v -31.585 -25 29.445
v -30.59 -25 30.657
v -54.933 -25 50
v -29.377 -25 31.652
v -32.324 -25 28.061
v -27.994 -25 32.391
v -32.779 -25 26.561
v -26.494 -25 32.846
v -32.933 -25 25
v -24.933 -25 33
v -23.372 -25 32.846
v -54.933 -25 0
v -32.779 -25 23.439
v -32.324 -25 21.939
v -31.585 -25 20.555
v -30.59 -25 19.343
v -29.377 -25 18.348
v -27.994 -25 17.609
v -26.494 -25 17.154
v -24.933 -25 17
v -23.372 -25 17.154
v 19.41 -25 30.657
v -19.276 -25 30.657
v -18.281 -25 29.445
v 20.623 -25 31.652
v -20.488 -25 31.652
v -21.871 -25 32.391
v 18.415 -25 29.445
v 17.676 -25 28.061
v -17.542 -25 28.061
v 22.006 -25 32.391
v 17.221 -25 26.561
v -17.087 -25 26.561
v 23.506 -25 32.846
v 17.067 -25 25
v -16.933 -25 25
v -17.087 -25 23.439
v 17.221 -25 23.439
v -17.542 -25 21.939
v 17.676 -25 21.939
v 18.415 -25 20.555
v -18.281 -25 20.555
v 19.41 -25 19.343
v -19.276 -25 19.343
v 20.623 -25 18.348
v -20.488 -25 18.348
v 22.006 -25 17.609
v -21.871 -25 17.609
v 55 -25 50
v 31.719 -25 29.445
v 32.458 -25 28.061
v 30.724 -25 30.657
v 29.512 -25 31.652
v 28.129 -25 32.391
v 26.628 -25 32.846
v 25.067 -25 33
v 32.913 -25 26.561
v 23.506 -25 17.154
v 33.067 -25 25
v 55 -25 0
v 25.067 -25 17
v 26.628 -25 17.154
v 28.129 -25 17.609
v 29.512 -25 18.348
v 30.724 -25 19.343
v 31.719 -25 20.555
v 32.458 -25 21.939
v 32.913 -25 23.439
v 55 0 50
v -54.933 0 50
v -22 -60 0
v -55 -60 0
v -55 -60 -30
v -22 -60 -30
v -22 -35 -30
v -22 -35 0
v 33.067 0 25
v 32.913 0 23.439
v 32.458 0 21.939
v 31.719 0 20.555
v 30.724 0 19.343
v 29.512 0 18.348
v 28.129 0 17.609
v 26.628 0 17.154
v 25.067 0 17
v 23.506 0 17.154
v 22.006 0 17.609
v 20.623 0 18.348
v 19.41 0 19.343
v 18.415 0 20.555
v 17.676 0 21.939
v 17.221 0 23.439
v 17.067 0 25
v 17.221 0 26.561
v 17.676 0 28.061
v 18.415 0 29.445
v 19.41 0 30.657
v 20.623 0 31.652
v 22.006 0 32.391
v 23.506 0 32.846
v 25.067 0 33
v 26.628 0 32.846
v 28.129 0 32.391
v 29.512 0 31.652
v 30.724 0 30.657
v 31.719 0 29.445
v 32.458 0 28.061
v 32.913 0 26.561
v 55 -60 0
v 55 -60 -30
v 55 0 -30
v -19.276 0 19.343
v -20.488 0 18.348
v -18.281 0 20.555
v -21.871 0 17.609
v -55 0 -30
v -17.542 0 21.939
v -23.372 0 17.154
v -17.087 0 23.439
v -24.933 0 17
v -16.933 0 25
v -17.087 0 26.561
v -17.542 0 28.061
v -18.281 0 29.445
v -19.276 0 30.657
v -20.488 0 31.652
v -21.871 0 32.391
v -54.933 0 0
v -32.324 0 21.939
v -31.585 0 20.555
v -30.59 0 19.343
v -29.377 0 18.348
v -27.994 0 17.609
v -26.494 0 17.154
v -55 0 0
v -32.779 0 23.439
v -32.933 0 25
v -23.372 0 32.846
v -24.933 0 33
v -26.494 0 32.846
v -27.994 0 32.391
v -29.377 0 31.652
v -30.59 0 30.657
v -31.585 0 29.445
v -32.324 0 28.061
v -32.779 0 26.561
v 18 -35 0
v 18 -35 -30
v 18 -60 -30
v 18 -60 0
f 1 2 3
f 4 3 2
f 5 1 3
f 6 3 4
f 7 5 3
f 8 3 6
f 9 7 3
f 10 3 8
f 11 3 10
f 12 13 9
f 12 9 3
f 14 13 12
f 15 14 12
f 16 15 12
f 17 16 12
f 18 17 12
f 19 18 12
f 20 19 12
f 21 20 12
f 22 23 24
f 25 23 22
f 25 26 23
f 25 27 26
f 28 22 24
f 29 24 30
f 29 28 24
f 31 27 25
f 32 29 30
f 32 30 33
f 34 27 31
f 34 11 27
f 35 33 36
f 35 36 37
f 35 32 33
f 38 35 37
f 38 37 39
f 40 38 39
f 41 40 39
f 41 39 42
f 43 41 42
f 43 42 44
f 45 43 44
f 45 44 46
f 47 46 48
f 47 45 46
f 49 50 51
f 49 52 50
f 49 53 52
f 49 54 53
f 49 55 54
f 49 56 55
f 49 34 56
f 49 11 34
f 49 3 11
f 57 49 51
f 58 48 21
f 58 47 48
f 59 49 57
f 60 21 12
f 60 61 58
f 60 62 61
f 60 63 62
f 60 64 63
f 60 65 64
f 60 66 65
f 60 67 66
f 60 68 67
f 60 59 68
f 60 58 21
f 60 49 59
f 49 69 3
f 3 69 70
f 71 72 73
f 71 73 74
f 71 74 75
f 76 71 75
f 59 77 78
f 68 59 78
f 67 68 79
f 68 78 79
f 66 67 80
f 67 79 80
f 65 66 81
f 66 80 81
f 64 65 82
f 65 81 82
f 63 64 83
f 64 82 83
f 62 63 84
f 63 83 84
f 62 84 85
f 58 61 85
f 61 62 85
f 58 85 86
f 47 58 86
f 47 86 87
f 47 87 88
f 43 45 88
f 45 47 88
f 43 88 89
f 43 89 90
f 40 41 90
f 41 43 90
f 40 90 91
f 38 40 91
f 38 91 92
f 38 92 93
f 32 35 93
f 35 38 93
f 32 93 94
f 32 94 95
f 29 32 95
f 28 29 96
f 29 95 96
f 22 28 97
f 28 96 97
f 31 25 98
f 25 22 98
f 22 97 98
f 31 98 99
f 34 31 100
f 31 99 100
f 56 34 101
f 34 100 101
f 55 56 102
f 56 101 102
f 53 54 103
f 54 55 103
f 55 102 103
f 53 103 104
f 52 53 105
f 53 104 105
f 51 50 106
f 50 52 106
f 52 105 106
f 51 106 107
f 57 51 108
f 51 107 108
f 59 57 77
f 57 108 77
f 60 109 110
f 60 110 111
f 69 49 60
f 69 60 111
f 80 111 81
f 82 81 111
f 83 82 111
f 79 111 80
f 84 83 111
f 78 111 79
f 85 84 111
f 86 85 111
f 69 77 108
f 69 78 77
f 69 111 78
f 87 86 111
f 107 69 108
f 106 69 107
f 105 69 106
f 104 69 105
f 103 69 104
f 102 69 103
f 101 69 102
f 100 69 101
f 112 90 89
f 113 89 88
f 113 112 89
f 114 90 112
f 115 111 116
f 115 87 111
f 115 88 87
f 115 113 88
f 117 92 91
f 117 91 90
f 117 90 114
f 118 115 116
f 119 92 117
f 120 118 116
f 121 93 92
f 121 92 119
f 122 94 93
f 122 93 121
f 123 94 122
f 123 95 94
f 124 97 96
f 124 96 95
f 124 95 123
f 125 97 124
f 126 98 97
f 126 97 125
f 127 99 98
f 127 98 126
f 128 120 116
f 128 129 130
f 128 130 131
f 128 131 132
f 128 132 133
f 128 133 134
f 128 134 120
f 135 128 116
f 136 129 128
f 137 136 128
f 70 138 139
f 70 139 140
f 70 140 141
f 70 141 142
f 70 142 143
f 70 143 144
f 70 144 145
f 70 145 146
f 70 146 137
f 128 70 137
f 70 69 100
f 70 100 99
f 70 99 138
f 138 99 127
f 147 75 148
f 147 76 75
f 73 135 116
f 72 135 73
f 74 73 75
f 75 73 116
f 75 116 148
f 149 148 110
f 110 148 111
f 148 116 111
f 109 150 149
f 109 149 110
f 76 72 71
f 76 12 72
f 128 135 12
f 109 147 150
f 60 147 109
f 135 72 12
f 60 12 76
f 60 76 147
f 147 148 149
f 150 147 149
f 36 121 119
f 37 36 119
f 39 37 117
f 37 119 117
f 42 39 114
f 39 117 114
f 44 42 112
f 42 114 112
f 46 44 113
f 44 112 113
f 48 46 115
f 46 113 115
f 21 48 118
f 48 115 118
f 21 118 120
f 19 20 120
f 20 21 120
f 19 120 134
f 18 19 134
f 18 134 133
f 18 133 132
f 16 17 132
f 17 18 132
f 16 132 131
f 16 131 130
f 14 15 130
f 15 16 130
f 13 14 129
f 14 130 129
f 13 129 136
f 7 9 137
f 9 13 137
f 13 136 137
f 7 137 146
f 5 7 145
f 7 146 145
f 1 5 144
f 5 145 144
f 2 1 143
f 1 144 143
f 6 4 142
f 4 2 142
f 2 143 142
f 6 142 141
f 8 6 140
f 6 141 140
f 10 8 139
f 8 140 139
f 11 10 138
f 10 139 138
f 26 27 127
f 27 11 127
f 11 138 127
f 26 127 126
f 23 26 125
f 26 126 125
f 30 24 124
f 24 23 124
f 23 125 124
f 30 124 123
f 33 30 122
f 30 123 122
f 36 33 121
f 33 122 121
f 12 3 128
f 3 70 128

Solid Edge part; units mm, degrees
sketch "Sketch1" plane through (0, 0, 0) normal (0, 0, 1) x (1, 0, 0)
  line L0 (55, -60) -> (55, 0)
  line L1 (55, 0) -> (-55, 0)
  line L2 (-55, 0) -> (-55, -60)
  line L3 (-55, -60) -> (-22, -60)
  line L4 (-22, -60) -> (-22, -35)
  line L5 (-22, -35) -> (18, -35)
  line L6 (18, -35) -> (18, -60)
  line L7 (18, -60) -> (55, -60)
extrude "Protrusion1" add sketch "Sketch1" against normal blind 30
sketch "Sketch2" plane through (0, 0, 0) normal (0, -1, 0) x (1, 0, 0)
  circle A0 centre (-24.9329, 25) radius 8
  circle A1 centre (25.0671, 25) radius 8
  line L0 (-54.9329, 0) -> (55, 0)
  line L1 (55, 0) -> (55, 50)
  line L2 (55, 50) -> (-54.9329, 50)
  line L3 (-54.9329, 50) -> (-54.9329, 0)
  dimension "D1" = 16
  dimension "D2" = 16
  dimension "D3" = 30
  dimension "D4" = 50
  dimension "D5" = 25
extrude "ExtrudedProtrusion_2" add sketch "Sketch2" along normal blind 25
